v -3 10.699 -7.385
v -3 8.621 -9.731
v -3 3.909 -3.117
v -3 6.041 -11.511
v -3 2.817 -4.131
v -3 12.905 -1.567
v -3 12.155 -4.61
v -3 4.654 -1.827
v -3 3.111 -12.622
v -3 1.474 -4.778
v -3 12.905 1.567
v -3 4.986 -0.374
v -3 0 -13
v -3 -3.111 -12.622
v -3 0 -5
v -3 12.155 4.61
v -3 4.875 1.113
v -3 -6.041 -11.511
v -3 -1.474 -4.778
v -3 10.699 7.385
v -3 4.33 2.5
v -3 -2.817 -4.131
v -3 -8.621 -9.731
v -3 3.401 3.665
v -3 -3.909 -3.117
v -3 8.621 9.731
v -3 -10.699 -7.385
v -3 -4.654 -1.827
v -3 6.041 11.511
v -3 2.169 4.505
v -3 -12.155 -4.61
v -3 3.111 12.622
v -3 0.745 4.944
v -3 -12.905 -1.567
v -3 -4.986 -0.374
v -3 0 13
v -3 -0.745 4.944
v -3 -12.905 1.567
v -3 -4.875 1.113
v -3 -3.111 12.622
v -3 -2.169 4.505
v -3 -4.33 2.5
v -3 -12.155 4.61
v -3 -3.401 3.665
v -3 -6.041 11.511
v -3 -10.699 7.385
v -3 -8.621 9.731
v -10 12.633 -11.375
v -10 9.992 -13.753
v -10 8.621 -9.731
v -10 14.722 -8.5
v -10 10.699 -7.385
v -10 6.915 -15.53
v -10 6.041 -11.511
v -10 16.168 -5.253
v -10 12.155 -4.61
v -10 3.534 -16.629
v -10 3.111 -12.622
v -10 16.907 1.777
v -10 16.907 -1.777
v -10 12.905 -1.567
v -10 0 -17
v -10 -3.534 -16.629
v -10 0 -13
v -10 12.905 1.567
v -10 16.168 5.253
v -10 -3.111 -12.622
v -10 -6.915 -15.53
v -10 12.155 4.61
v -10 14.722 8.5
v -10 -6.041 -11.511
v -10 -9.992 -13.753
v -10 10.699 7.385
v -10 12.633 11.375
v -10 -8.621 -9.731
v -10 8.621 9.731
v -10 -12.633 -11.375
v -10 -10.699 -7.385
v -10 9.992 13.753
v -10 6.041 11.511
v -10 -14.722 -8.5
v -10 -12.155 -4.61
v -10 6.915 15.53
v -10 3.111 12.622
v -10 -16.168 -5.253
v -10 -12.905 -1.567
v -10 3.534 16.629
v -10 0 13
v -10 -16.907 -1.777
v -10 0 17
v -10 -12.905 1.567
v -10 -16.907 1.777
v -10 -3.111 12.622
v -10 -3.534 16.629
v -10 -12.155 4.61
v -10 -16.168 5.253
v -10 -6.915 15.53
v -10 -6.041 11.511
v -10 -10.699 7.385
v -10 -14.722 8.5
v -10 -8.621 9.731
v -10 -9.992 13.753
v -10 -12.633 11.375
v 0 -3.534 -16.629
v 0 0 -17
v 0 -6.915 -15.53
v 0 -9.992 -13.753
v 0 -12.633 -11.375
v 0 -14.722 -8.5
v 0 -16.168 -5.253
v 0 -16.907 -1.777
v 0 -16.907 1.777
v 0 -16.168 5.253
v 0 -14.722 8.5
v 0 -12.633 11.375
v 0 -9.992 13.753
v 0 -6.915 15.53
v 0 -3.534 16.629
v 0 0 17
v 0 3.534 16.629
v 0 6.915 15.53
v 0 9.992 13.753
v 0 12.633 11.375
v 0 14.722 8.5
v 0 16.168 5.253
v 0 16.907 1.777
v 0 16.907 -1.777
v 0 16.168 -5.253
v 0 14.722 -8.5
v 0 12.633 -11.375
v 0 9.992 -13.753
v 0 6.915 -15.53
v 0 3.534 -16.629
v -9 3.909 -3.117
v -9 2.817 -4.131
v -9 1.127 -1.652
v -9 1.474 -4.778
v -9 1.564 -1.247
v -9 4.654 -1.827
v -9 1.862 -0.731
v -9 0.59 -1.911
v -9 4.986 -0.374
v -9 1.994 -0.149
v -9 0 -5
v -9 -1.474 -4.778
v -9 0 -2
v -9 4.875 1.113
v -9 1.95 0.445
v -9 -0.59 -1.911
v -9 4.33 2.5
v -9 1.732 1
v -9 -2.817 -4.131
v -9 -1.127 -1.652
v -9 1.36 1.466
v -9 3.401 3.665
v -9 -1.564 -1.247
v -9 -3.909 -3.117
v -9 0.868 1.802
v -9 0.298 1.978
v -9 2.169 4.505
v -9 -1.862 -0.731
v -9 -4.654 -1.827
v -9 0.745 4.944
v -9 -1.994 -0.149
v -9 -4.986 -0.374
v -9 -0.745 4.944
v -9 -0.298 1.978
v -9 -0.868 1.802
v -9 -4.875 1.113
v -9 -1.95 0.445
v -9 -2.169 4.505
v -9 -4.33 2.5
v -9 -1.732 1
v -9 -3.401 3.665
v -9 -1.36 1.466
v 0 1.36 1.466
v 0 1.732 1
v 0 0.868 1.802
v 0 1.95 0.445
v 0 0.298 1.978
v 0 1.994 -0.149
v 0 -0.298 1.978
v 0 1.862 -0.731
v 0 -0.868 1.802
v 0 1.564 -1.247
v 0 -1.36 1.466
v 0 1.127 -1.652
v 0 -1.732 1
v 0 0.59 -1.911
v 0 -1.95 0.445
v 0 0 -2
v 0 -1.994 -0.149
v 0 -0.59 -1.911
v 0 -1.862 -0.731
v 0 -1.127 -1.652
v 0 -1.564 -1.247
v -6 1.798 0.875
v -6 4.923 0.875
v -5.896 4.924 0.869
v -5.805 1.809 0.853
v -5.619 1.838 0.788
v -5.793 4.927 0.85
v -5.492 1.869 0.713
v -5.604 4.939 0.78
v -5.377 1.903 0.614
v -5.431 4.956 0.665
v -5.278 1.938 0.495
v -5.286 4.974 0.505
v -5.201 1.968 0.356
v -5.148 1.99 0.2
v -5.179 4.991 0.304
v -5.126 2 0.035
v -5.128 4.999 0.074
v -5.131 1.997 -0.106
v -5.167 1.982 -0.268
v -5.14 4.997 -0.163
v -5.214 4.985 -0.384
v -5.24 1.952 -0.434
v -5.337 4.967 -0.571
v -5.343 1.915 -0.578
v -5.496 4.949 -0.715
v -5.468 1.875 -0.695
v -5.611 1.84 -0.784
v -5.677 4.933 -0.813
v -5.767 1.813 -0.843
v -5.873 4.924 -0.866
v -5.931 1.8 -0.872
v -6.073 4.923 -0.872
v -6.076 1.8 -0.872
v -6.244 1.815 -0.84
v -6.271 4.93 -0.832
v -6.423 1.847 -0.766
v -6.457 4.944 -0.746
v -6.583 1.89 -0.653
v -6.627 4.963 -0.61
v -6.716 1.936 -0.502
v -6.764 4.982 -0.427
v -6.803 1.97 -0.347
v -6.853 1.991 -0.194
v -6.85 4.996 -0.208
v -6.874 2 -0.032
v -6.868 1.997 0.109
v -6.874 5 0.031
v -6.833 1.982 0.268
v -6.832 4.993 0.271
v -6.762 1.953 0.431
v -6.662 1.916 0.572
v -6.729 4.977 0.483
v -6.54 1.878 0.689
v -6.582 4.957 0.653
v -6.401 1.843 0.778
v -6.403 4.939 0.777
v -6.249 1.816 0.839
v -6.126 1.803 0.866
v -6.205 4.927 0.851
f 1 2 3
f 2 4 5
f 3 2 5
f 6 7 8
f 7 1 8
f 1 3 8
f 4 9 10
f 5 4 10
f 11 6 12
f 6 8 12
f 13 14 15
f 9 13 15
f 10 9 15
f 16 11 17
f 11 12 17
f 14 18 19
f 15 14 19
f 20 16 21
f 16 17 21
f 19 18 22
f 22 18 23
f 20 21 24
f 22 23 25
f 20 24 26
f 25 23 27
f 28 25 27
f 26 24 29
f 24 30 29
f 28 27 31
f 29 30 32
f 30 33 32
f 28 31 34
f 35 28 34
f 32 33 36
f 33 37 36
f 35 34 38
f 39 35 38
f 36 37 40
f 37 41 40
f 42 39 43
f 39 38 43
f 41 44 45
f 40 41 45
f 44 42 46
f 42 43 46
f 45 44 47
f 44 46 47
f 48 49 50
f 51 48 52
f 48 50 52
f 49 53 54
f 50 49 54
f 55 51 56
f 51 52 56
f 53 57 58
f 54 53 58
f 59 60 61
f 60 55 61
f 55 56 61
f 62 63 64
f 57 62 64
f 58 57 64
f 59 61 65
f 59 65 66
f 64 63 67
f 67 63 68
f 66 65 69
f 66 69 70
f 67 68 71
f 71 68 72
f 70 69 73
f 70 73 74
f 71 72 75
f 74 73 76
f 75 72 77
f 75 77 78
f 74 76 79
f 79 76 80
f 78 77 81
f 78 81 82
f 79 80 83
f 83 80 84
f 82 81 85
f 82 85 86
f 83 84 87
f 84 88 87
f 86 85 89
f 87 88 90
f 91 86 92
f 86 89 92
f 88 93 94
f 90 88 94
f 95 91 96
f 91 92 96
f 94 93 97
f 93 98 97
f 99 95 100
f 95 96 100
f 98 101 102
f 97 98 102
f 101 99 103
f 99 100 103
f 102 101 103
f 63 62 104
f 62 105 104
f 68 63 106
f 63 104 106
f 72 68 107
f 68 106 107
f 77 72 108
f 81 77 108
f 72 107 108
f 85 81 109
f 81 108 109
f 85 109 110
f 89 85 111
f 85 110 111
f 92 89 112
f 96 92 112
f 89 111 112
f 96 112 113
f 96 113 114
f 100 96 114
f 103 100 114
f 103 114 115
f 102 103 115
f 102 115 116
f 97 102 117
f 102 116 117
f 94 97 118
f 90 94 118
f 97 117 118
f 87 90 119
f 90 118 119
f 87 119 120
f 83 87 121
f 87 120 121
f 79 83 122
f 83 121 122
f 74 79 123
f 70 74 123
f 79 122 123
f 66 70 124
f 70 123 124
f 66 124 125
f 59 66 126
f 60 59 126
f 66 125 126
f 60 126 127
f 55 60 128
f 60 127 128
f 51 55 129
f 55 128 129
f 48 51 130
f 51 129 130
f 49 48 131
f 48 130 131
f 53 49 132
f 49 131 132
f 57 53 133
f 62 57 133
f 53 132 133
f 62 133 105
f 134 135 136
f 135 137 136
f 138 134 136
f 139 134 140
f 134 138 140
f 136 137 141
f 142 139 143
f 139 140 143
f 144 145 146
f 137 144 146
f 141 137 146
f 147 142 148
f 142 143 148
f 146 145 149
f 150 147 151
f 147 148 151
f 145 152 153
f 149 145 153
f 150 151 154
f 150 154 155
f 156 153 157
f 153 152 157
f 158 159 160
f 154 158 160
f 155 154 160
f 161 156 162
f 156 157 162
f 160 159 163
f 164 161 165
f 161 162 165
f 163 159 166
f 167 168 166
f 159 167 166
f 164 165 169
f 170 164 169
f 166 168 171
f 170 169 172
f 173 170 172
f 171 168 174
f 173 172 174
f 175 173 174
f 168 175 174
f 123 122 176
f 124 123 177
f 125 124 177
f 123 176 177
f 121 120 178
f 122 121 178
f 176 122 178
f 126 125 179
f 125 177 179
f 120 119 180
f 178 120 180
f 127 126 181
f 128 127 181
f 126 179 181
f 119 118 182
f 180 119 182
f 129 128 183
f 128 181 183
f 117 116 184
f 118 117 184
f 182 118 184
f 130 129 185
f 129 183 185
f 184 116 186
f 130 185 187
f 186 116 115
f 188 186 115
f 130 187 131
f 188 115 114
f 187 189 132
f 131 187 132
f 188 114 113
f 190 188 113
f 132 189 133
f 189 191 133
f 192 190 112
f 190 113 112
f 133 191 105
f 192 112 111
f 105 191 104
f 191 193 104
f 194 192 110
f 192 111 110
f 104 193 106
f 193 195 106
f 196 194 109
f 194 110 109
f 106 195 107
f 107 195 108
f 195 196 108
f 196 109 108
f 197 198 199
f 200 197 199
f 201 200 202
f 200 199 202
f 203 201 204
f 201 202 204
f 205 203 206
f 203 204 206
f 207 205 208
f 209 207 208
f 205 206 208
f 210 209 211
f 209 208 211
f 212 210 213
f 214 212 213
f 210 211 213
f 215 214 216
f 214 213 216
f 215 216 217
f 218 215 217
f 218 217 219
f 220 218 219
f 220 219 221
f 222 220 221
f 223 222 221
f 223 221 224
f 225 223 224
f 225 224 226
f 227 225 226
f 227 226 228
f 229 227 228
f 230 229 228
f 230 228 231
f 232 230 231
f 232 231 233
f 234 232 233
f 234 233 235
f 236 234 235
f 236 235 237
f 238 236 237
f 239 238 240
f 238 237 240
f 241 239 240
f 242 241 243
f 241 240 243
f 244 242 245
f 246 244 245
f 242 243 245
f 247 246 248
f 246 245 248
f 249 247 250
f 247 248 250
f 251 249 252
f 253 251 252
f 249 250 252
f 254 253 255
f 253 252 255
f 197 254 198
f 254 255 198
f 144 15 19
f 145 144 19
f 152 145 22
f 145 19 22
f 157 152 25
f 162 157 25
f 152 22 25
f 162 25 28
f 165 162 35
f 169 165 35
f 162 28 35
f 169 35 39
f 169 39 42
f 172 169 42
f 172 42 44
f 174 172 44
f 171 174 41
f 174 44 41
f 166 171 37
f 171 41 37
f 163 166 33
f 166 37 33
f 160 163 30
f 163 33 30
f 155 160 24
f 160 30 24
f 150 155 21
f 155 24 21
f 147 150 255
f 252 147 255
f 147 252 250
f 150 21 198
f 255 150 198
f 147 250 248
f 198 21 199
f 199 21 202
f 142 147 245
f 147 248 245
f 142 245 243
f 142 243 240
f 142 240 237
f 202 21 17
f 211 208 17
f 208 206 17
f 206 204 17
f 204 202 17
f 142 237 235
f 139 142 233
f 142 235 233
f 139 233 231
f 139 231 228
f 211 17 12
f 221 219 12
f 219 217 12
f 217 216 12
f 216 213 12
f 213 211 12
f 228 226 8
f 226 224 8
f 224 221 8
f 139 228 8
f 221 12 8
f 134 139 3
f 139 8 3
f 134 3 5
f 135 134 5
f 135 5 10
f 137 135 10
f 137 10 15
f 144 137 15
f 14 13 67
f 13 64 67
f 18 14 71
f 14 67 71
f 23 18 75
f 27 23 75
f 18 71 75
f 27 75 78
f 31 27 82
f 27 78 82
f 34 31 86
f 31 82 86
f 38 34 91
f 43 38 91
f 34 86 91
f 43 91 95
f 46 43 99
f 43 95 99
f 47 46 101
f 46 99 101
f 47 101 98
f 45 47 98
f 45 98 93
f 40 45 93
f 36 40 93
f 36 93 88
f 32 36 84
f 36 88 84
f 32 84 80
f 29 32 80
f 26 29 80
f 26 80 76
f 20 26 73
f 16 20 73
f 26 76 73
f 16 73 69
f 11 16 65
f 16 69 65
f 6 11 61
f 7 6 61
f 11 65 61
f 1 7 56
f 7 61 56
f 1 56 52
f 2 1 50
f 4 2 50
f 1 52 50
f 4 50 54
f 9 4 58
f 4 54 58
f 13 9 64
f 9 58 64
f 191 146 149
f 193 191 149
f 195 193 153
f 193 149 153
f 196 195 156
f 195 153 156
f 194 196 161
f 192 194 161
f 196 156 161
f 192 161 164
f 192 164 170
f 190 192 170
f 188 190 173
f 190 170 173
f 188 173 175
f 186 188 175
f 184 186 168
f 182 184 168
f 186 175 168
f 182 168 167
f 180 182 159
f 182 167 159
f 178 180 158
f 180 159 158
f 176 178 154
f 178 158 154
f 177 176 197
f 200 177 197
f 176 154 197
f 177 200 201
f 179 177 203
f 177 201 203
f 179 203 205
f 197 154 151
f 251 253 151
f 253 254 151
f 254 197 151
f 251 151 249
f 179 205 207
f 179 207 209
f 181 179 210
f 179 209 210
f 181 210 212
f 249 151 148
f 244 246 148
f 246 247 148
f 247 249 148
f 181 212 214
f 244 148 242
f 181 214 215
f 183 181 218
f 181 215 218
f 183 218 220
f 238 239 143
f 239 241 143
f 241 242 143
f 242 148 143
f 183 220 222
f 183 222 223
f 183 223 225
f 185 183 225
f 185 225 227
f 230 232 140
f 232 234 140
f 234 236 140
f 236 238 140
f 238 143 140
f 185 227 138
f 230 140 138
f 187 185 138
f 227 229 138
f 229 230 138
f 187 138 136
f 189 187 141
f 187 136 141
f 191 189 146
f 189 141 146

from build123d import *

# Parameters (mm, degrees)
BROCA_DE_ROSQUEAR_PARA_TARRAXA_DE_M2_2X0_REACH = 30.443
BROCA_DE_ROSQUEAR_PARA_TARRAXA_DE_M2_2_R       = 0.875


with BuildPart() as part:
    # Esboço3 → Revolução1 (revolve)
    with BuildSketch(Plane.XY, mode=Mode.PRIVATE) as revolu_o1_sk:
        Polygon((0, 17), (0, 2), (-9, 2), (-9, 5), (-3, 5), (-3, 13), (-10, 13), (-10, 17), align=None)
    revolve(revolu_o1_sk.sketch.rotate(Axis((0, 0, 0), (-1, 0, 0)), 90), axis=Axis((0, 0, 0), (-1, 0, 0)))

    # Broca de rosquear para tarraxa de M2 2 (on position points) → Broca de rosquear para tarraxa de M2.2x0.451 (cut, up to next)
    with BuildSketch(Plane(origin=(-6, 5, 0), x_dir=(0, 0, 1), z_dir=(0, 1, 0)), mode=Mode.PRIVATE) as broca_de_rosquear_para_tarraxa_de_m2_2x0_sk1:
        Circle(BROCA_DE_ROSQUEAR_PARA_TARRAXA_DE_M2_2_R)
    broca_de_rosquear_para_tarraxa_de_m2_2x0_tool1 = extrude(broca_de_rosquear_para_tarraxa_de_m2_2x0_sk1.sketch, amount=-BROCA_DE_ROSQUEAR_PARA_TARRAXA_DE_M2_2X0_REACH, mode=Mode.PRIVATE) & part.part
    add(broca_de_rosquear_para_tarraxa_de_m2_2x0_tool1.solids().sort_by_distance((-6, 5, 0))[0], mode=Mode.SUBTRACT)


solid = part.part
